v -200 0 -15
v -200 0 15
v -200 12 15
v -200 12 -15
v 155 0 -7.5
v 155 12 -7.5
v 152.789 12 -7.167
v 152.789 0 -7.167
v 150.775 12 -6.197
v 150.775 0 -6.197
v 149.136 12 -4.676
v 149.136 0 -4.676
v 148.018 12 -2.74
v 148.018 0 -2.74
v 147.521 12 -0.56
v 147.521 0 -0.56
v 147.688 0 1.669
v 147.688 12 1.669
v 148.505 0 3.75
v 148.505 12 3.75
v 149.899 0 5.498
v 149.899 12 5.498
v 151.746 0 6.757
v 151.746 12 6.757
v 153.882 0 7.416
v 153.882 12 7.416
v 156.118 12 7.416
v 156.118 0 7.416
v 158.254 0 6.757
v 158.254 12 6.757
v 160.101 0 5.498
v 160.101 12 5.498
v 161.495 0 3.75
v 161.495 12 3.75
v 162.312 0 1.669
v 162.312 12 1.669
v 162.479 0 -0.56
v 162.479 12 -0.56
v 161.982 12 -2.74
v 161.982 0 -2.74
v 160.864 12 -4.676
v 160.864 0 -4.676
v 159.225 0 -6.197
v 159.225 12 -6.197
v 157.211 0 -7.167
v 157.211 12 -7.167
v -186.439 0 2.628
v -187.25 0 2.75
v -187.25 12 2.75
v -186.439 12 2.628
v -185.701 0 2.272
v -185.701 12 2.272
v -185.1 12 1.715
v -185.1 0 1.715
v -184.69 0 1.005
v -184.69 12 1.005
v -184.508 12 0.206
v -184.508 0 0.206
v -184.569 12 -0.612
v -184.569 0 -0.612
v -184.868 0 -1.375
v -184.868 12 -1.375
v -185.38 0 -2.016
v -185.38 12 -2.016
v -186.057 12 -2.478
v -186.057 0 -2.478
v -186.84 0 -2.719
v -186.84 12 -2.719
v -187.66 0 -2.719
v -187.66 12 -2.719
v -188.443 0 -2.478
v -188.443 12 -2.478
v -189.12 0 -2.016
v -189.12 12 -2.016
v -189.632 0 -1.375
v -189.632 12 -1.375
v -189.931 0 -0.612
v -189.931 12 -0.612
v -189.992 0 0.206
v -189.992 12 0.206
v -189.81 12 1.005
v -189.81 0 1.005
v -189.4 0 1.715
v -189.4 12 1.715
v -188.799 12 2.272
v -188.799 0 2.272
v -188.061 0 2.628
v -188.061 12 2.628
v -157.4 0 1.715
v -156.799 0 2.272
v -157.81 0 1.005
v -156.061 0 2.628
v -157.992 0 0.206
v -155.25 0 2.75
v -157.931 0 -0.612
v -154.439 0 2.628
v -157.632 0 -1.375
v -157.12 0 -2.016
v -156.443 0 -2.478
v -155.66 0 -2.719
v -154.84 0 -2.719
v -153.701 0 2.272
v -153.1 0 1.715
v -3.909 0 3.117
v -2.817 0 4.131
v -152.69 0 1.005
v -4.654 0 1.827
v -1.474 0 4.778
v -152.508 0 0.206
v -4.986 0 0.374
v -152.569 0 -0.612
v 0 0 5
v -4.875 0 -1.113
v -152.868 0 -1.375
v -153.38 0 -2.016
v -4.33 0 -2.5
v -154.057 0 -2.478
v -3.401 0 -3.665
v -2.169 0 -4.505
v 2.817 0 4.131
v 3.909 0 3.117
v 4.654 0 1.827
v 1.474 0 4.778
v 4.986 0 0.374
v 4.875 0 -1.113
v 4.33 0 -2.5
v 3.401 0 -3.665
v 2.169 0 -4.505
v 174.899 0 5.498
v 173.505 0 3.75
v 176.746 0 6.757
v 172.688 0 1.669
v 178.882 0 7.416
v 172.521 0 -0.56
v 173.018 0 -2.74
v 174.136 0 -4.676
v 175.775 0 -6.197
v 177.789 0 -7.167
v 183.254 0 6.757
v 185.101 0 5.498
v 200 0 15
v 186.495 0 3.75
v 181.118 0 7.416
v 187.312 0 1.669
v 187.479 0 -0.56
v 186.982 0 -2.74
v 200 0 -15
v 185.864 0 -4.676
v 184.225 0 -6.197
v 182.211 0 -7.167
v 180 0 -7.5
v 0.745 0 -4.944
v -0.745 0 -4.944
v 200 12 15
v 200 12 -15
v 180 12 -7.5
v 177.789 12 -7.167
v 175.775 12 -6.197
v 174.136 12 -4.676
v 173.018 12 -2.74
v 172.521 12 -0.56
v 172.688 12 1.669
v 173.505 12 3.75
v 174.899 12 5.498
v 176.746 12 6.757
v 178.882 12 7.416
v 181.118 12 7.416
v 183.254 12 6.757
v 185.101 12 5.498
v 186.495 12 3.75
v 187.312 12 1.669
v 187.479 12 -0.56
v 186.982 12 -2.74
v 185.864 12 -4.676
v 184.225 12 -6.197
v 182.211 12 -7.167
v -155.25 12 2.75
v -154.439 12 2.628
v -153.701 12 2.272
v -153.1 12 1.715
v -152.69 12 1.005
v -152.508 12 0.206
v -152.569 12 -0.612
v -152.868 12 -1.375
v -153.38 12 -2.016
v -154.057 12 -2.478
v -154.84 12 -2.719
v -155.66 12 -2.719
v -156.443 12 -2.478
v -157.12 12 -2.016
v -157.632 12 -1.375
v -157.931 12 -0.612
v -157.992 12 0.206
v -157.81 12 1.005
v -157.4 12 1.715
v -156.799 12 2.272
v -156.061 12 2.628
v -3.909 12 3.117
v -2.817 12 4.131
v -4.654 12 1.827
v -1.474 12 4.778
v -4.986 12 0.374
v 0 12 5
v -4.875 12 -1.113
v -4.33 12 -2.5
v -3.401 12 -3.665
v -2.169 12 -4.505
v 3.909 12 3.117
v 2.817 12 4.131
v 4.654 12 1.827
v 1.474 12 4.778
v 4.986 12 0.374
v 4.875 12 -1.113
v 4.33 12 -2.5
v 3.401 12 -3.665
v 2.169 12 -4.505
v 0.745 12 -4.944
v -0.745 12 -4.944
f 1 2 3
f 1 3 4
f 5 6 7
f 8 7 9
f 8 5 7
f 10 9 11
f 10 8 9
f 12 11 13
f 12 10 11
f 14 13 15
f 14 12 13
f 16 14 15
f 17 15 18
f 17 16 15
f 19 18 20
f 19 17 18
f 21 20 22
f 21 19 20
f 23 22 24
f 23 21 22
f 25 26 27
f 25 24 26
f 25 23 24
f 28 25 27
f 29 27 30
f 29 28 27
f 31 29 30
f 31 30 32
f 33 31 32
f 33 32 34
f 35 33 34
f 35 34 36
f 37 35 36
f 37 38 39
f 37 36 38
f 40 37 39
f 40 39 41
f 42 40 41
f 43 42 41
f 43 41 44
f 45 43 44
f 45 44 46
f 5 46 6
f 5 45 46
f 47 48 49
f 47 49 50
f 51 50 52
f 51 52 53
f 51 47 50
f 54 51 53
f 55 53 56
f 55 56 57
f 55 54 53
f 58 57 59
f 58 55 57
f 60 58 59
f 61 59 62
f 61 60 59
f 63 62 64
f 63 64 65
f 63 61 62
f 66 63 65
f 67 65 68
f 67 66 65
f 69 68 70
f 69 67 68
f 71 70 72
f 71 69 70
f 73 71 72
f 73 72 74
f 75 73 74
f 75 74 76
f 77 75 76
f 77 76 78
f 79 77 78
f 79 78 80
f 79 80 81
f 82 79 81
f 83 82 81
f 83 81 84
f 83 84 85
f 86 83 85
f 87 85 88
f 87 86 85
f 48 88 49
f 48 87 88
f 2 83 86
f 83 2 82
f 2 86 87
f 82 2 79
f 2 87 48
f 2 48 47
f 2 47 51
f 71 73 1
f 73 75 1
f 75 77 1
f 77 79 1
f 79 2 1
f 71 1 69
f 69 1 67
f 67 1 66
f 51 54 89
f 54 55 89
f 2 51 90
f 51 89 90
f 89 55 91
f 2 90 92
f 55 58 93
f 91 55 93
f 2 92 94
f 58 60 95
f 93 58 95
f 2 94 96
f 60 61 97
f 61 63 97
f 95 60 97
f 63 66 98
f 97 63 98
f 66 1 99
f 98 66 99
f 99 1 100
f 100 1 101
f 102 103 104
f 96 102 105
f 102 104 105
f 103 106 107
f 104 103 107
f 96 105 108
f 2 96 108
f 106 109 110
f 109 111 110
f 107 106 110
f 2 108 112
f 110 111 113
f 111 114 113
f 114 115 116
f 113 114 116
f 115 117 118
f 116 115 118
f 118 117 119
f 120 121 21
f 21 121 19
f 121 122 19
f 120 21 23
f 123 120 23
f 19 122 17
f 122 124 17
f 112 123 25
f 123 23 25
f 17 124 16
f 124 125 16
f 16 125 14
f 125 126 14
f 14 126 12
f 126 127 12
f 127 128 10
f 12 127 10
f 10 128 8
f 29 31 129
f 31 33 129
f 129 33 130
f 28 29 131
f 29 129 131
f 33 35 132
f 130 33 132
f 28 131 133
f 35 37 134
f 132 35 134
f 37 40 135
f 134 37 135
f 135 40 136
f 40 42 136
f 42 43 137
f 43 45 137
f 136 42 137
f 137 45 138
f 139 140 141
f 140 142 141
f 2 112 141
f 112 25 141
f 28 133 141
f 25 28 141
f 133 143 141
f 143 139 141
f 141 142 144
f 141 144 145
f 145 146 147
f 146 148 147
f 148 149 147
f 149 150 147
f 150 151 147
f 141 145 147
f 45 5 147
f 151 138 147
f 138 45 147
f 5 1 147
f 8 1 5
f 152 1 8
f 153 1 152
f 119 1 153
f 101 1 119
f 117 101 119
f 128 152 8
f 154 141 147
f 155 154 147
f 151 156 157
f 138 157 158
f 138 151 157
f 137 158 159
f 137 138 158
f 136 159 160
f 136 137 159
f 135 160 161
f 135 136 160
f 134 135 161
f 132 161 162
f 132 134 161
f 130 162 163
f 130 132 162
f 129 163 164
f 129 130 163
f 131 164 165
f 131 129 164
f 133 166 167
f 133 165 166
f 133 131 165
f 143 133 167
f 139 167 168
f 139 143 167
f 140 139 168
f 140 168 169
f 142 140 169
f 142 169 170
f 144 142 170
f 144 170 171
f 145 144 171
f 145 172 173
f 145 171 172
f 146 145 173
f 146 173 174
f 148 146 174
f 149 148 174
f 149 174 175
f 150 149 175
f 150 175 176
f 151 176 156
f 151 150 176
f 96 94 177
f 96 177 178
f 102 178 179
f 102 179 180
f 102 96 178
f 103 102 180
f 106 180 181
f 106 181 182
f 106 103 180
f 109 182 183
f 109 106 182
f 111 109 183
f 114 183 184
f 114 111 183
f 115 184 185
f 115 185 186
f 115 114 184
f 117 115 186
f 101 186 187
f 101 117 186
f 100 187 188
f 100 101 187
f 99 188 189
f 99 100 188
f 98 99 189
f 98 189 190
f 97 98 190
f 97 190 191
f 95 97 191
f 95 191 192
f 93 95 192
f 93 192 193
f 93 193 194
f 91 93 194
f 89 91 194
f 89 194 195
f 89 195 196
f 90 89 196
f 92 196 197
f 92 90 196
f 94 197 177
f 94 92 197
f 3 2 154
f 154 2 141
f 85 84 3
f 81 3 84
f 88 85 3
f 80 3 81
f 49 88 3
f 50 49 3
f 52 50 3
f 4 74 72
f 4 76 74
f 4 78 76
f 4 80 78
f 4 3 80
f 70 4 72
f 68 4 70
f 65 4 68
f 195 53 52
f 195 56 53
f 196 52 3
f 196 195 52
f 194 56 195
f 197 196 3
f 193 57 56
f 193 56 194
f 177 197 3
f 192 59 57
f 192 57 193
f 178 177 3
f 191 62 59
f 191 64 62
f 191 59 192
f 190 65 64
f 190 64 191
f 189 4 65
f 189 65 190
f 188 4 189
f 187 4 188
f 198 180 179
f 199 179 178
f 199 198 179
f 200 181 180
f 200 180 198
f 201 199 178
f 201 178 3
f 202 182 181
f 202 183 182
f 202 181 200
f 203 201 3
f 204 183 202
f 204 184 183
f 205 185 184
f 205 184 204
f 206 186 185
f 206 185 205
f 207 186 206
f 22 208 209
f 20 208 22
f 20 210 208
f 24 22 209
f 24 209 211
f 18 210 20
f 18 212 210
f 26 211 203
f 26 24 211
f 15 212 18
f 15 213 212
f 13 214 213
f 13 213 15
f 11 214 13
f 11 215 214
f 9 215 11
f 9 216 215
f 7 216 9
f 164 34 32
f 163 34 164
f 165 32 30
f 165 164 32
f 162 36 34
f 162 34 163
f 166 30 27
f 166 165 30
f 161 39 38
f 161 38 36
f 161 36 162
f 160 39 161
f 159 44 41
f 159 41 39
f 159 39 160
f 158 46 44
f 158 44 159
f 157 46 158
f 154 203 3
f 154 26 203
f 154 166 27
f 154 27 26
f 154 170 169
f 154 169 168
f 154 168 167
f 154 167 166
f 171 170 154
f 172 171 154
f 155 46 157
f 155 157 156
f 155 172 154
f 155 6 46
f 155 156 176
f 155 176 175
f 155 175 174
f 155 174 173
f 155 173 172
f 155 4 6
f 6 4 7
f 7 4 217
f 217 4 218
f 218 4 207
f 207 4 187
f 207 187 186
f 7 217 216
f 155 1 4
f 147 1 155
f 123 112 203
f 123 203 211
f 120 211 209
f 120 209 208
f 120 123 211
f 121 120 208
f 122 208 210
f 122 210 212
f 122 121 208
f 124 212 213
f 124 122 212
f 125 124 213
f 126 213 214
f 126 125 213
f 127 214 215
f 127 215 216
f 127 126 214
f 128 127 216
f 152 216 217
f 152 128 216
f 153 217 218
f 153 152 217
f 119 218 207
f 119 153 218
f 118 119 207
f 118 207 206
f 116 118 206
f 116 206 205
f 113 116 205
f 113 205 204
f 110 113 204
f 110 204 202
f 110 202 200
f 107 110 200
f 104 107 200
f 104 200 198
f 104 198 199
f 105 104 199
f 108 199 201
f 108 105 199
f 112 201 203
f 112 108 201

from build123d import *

# Parameters (mm, degrees)
SKETCH1_W           = 400
SKETCH1_H           = 30
SKETCH1_R           = 5
SKETCH1_R_2         = 2.75
BOSS_EXTRUDE1_DEPTH = 12
SKETCH2_R           = 7.5
CUT_EXTRUDE1_DEPTH  = 20


with BuildPart() as part:
    # Sketch1 → Boss-Extrude1 (new body)
    with BuildSketch(Plane(origin=(0, 0, 0), x_dir=(1, 0, 0), z_dir=(0, 1, 0))):
        Rectangle(SKETCH1_W, SKETCH1_H)
        with Locations(Location((0, 0, 0), (0, 0, 270))):
            Circle(SKETCH1_R, mode=Mode.SUBTRACT)
        with Locations(Location((-187.25, 0, 0), (0, 0, 270))):
            Circle(SKETCH1_R_2, mode=Mode.SUBTRACT)
        with Locations(Location((-155.25, 0, 0), (0, 0, 270))):
            Circle(SKETCH1_R_2, mode=Mode.SUBTRACT)
    extrude(amount=BOSS_EXTRUDE1_DEPTH)

    # Sketch2 → Cut-Extrude1 (cut)
    with BuildSketch(Plane(origin=(0, 0, 0), x_dir=(1, 0, 0), z_dir=(0, 1, 0))):
        with Locations(Location((155, 0, 0), (0, 0, 90))):
            Circle(SKETCH2_R)
        with Locations(Location((180, 0, 0), (0, 0, 90))):
            Circle(SKETCH2_R)
    extrude(amount=CUT_EXTRUDE1_DEPTH, mode=Mode.SUBTRACT)


solid = part.part
